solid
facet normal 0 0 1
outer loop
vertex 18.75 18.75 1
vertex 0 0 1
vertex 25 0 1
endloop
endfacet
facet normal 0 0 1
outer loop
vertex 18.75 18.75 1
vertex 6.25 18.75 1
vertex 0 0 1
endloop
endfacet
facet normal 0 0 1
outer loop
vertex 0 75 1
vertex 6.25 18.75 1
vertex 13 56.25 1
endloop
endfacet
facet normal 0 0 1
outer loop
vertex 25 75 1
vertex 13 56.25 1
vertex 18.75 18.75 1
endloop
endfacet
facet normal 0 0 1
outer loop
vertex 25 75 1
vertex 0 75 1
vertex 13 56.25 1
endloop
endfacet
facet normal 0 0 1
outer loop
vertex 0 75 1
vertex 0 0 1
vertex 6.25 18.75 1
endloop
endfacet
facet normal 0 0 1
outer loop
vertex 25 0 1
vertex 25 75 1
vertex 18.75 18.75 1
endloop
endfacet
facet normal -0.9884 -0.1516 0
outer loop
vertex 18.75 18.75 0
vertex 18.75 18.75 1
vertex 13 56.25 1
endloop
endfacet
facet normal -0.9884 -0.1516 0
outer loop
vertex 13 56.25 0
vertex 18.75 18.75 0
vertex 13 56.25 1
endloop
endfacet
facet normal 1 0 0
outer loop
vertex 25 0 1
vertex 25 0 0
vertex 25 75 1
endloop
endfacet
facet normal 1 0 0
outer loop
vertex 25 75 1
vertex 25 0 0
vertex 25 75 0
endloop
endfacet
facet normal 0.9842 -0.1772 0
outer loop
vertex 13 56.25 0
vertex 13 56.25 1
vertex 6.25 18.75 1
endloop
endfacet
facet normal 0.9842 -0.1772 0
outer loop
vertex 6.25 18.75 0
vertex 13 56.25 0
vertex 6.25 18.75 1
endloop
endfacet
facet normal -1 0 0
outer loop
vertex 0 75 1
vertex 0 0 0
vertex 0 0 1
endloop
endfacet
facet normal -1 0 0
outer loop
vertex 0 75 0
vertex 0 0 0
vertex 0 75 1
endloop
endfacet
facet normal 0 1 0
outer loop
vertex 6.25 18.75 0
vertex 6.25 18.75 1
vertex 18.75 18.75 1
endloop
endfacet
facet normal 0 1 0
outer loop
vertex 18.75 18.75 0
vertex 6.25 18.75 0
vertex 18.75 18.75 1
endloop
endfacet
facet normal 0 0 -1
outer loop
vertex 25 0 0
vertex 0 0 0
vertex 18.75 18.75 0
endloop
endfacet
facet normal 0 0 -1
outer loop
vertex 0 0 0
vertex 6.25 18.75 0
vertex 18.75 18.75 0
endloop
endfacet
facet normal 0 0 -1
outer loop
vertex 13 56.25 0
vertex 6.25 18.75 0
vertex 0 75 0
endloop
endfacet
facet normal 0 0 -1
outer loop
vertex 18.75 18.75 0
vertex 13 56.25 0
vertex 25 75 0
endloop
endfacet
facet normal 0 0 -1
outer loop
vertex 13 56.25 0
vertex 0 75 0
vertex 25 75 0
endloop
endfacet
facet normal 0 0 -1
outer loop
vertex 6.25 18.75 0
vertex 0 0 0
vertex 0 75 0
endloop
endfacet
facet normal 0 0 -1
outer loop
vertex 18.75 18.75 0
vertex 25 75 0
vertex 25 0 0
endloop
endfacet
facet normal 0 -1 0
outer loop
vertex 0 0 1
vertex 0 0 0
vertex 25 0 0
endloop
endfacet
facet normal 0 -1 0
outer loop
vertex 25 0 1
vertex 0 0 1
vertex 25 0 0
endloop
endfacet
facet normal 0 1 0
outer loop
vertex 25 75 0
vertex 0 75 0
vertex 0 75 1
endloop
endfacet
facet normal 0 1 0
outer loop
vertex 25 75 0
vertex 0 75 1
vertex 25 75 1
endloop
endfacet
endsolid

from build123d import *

# Parameters (mm, degrees)
PAD001_DEPTH      = 2
PAD001_DEPTH_BACK = 2
SKETCH018_W       = 25
SKETCH018_H       = 75
PAD017_DEPTH      = 1


with BuildPart() as body001:
    # Sketch002 → Pad001 (new body, two sides)
    with BuildSketch(Plane.XY) as pad001_sk:
        Polygon((13, 56.25), (6.25, 18.75), (18.75, 18.75), align=None)
    extrude(amount=PAD001_DEPTH)
    extrude(pad001_sk.sketch, amount=-PAD001_DEPTH_BACK)


with BuildPart() as body016:
    # Sketch018 → Pad017 (new body)
    with BuildSketch(Plane.XY):
        with Locations((12.5, 37.5)):
            Rectangle(SKETCH018_W, SKETCH018_H)
    extrude(amount=PAD017_DEPTH)

    # Boolean001: cut Body001
    add(body001.part, mode=Mode.SUBTRACT)


solid = body016.part
